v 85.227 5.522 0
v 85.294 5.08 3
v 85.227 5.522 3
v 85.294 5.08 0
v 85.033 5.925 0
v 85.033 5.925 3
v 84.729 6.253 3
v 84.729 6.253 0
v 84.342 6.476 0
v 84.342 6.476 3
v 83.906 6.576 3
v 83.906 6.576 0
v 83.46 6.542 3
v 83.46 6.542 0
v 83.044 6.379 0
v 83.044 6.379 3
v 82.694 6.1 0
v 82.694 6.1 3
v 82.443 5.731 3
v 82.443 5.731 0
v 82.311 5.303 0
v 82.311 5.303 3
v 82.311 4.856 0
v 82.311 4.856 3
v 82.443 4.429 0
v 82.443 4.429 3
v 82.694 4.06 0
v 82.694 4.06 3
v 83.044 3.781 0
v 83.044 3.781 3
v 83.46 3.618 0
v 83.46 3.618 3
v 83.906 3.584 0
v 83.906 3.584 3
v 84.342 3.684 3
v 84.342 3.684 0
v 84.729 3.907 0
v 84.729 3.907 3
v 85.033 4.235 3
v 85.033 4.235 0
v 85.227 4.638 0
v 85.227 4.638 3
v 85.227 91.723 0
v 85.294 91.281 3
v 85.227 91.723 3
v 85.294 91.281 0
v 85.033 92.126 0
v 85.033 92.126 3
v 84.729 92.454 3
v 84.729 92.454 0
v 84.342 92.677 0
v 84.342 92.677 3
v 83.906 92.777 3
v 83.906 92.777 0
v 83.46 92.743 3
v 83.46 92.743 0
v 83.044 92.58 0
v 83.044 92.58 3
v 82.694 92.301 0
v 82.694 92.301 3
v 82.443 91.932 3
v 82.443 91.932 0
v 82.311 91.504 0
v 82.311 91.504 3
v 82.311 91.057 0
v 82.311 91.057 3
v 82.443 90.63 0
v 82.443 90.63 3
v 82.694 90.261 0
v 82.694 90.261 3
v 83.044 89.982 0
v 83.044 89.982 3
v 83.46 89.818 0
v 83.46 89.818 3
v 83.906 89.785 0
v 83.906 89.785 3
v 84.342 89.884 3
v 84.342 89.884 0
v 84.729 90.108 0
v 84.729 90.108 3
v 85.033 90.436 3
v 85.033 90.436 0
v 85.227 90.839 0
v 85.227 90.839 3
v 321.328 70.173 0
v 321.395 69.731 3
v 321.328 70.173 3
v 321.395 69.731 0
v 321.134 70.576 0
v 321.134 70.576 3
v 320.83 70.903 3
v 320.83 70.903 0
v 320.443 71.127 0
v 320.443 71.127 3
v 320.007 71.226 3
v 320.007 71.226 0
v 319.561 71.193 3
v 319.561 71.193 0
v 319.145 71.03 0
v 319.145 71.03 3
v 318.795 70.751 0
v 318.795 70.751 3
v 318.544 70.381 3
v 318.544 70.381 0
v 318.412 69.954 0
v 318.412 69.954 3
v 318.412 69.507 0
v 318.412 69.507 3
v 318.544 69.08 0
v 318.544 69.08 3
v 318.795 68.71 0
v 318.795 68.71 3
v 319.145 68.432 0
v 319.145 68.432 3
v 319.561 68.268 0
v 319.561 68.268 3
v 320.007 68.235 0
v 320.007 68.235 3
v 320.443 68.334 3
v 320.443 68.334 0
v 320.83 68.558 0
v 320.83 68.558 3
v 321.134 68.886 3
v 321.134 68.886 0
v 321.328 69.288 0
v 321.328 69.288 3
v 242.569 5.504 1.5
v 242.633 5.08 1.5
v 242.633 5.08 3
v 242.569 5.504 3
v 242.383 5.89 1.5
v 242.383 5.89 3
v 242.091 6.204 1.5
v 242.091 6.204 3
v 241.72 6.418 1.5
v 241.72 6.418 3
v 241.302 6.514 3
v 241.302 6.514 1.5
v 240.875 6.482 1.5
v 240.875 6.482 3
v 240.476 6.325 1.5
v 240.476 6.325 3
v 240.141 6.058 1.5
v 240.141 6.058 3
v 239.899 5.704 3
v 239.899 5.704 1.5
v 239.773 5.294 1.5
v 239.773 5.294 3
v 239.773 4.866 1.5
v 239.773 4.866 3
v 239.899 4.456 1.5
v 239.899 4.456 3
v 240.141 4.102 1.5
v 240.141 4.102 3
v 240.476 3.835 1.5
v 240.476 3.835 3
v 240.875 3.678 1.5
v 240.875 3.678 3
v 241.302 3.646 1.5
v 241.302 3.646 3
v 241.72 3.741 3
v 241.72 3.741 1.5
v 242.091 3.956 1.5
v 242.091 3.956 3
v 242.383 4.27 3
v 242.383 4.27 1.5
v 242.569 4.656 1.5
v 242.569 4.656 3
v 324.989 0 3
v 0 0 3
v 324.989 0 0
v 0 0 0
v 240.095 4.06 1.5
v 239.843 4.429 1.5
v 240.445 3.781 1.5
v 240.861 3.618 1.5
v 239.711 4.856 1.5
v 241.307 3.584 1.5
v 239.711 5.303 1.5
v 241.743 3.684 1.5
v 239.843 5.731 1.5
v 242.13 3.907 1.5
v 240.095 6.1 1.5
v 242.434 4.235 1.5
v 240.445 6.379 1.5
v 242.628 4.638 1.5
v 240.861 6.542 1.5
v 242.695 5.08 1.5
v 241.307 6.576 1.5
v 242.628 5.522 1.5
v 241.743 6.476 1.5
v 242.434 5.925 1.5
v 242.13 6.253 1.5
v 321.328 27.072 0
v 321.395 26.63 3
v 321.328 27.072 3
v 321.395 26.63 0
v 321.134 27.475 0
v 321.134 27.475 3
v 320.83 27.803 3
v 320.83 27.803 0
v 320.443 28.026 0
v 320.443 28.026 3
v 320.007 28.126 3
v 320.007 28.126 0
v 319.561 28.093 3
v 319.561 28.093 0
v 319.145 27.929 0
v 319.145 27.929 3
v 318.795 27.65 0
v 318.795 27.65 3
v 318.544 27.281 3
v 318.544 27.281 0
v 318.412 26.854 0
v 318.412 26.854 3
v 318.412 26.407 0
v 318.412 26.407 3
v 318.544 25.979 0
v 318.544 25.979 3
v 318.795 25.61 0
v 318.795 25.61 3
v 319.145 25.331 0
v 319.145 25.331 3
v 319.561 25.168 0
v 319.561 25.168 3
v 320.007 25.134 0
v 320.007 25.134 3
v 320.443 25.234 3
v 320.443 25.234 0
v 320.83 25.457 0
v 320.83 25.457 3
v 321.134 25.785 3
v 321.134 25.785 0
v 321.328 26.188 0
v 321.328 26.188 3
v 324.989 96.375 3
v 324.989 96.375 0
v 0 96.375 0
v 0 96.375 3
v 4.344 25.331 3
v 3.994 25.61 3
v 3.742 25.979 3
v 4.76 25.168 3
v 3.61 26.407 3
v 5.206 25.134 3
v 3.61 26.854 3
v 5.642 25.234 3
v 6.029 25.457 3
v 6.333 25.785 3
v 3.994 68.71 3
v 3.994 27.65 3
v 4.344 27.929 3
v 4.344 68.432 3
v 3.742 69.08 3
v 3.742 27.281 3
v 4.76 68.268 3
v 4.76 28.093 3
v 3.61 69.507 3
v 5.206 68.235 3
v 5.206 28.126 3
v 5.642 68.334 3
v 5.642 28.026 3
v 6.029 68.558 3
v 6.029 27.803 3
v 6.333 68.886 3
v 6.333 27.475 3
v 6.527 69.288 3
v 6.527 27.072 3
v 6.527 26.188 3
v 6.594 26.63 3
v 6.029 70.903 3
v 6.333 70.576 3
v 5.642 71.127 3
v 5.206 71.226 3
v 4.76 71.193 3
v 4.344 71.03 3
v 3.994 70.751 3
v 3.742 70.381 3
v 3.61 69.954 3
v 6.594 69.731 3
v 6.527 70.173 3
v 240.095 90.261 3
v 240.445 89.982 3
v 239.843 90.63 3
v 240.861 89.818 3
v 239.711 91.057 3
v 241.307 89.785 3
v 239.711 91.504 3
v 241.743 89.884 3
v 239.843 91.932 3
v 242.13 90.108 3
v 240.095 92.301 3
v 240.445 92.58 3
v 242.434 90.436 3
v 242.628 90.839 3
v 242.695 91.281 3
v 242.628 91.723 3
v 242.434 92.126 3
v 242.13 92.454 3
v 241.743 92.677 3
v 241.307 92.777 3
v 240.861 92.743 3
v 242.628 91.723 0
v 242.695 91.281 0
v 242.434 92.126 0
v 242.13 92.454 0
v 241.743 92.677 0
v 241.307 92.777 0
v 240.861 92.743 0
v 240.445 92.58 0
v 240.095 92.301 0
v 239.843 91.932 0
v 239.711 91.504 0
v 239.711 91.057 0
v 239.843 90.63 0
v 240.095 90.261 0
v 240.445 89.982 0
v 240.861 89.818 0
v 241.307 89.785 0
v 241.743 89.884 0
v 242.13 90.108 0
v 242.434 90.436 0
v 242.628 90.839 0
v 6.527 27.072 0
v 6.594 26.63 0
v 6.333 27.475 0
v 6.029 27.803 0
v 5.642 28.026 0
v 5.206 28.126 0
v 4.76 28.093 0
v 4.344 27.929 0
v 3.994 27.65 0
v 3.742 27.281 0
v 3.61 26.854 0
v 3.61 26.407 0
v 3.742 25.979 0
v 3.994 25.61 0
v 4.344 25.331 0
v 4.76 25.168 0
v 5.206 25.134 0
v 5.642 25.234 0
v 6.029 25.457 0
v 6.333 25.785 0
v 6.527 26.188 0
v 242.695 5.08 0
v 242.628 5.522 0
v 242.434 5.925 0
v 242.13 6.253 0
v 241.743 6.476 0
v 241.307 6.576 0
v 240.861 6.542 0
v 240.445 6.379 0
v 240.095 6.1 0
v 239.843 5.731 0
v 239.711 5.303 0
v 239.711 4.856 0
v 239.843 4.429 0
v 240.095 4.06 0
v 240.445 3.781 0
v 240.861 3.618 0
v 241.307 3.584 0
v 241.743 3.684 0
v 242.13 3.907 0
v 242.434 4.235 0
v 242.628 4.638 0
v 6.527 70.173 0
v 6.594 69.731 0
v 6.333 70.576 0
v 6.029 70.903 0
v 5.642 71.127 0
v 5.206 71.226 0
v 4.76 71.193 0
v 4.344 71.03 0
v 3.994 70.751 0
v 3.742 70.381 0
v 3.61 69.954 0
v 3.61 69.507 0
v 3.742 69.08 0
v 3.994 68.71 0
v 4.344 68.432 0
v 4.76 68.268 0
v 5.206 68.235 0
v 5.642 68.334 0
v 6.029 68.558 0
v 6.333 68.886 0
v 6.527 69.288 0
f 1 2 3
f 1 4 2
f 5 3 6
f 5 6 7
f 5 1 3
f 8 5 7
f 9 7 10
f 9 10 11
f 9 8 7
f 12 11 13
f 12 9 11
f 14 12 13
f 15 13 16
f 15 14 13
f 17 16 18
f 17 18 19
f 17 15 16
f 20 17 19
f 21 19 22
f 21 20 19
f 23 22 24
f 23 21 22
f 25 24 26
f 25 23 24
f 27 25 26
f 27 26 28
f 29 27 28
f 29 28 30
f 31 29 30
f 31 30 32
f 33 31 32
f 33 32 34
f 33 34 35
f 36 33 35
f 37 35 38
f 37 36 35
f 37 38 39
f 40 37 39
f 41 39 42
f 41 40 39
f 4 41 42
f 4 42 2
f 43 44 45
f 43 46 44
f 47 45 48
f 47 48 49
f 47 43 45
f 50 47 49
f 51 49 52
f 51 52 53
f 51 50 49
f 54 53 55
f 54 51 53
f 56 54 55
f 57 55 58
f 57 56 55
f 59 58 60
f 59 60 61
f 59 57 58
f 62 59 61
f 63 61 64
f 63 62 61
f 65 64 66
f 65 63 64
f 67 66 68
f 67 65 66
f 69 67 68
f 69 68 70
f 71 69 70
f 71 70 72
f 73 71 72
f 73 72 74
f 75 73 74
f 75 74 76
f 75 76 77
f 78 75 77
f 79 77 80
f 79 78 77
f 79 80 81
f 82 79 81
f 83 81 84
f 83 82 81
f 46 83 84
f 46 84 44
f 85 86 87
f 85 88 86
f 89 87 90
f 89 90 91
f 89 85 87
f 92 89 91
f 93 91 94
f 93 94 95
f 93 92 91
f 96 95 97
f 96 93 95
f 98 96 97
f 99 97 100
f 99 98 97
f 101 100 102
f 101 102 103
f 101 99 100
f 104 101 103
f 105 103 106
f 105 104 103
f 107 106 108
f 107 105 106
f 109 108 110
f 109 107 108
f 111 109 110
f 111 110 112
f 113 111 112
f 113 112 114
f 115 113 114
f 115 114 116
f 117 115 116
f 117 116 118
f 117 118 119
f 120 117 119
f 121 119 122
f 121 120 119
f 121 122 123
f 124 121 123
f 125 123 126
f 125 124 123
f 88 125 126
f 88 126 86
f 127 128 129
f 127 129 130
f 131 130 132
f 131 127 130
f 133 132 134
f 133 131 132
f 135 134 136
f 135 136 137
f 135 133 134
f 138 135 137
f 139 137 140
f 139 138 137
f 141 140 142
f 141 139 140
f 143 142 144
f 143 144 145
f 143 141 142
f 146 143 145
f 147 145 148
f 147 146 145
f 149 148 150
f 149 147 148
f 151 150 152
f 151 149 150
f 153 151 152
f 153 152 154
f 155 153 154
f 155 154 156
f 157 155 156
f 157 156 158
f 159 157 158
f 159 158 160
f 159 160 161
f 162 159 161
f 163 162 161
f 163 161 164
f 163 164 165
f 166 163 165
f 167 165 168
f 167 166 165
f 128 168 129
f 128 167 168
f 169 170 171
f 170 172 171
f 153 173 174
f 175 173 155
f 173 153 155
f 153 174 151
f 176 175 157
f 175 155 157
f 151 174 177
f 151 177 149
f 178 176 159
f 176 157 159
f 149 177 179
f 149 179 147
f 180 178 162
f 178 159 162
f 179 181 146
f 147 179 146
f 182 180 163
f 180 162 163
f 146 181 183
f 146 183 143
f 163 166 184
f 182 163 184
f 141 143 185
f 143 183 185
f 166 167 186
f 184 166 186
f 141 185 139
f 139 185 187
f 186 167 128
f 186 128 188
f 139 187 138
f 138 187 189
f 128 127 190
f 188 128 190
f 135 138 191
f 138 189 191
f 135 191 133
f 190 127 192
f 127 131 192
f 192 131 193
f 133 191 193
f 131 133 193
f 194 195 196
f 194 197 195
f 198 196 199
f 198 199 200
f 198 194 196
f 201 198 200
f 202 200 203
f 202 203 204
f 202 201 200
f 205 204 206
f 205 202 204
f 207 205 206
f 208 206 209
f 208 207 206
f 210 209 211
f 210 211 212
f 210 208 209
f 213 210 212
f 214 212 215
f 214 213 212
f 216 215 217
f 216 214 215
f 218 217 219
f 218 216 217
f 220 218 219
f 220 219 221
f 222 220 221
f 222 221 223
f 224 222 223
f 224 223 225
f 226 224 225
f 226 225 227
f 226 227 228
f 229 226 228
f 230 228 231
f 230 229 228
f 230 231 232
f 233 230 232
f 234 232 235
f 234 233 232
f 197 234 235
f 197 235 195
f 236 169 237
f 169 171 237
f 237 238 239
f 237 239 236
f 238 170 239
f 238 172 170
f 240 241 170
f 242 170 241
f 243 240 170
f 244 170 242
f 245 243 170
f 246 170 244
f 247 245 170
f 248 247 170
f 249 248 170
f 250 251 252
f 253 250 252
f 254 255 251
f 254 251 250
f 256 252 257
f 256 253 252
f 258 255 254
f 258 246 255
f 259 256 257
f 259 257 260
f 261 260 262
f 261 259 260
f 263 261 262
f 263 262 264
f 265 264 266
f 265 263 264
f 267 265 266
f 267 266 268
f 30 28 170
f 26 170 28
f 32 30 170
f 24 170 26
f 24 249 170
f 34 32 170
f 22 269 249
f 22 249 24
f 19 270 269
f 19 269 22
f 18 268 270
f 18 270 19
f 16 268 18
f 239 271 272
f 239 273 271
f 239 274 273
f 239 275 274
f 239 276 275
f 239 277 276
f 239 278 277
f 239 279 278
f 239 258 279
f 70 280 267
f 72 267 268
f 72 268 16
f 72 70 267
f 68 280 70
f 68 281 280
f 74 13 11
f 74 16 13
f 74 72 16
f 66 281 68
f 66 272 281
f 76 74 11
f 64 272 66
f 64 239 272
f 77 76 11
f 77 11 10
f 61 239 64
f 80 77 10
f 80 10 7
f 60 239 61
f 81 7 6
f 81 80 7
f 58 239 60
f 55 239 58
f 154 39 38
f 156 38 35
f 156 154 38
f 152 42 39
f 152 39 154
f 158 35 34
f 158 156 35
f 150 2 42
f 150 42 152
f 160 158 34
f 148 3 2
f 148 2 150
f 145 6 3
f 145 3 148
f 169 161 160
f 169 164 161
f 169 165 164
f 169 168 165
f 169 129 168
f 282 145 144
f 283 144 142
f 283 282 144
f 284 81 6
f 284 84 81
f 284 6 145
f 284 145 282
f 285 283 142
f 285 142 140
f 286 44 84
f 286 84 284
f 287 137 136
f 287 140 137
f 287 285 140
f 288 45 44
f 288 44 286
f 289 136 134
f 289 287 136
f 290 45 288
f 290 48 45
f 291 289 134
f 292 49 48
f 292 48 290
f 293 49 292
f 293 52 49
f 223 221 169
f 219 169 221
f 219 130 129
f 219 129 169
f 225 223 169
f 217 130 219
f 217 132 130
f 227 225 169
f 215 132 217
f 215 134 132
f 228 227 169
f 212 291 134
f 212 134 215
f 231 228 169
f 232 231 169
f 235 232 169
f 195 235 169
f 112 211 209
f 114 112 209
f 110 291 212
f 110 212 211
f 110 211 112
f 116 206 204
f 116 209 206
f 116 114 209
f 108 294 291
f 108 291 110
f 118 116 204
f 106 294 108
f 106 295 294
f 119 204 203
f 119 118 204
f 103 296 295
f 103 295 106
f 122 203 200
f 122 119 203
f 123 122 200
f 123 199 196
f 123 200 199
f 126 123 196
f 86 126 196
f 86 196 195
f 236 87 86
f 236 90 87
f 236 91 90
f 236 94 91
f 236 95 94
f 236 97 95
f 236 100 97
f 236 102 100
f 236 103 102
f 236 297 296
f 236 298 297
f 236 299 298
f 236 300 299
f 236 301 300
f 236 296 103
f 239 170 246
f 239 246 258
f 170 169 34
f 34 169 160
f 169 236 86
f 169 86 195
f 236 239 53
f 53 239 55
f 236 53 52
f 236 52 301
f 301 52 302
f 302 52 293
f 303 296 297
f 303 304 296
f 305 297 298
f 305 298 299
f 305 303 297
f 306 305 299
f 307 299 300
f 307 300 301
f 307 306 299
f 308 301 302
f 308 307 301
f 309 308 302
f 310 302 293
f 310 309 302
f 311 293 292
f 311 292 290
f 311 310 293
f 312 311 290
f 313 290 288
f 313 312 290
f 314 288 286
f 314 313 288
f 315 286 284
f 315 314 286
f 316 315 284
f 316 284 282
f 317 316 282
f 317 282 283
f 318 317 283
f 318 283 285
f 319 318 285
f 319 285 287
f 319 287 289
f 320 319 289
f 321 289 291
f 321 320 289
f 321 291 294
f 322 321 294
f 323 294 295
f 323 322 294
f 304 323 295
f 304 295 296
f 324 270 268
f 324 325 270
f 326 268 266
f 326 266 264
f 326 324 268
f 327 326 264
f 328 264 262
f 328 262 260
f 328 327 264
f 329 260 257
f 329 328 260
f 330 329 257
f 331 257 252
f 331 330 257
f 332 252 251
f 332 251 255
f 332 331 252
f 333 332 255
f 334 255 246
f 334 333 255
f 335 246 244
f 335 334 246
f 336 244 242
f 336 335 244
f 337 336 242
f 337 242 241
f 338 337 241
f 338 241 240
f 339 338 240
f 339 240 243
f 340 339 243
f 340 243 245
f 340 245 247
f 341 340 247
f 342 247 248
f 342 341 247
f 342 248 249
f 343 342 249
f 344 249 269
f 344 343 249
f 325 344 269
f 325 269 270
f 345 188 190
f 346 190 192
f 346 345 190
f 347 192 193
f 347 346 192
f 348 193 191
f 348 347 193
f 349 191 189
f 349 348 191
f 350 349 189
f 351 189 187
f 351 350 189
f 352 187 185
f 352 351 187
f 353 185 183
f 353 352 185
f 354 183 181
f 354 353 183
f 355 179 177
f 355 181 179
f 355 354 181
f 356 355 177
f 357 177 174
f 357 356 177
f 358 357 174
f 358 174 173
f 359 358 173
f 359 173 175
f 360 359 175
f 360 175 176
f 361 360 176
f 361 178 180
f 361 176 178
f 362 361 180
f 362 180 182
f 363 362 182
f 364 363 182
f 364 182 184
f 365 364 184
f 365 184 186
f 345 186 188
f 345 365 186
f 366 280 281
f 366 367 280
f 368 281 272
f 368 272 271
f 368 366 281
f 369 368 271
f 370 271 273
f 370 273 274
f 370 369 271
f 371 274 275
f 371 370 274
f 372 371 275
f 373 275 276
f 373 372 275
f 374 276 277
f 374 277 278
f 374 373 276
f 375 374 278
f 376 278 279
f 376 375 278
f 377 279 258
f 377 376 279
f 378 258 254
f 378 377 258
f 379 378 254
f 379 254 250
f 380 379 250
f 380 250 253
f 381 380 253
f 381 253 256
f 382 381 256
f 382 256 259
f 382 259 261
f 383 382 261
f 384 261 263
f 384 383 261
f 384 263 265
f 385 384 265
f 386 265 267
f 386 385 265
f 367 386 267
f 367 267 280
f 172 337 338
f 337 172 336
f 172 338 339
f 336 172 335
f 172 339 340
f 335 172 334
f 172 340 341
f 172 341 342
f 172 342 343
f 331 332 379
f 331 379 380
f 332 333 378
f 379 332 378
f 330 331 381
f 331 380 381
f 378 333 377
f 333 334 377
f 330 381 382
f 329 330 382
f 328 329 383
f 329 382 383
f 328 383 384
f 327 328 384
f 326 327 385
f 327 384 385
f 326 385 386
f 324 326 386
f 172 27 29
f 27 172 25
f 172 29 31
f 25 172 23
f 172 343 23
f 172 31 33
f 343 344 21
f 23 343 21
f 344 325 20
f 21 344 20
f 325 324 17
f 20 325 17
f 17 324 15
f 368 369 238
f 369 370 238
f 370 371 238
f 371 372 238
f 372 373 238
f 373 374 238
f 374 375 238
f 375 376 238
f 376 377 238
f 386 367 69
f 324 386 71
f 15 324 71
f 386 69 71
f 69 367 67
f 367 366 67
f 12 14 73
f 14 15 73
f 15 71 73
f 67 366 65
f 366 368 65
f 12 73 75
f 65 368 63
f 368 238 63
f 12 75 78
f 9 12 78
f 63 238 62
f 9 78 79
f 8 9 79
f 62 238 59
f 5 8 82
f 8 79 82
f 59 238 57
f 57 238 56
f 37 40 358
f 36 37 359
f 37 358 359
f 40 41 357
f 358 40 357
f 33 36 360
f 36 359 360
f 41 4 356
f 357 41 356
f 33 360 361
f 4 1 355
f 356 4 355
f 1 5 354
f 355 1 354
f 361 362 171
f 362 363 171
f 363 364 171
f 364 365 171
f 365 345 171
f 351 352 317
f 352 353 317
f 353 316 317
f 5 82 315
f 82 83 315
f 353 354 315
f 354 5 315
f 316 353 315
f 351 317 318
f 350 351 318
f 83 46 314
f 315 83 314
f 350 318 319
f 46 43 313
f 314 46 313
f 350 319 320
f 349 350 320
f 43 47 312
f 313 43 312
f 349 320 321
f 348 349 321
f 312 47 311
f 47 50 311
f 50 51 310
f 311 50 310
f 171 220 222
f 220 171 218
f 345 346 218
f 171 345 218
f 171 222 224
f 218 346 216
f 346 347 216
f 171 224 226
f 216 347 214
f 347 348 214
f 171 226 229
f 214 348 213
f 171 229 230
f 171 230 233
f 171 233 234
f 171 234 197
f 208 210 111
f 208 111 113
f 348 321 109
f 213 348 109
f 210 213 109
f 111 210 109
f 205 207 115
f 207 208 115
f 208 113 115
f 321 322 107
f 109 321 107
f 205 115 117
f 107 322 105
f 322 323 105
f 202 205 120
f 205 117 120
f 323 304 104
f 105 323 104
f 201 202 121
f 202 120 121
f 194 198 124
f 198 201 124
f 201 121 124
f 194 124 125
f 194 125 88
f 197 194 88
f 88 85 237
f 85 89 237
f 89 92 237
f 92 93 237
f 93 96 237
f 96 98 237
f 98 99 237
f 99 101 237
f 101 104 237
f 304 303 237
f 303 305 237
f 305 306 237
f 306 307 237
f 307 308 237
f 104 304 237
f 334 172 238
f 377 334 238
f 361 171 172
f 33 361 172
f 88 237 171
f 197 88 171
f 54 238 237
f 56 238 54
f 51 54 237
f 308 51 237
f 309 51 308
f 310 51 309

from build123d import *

# Parameters (mm, degrees)
MODEL_W             = 304.8012934
MODEL_H             = 76.2008736
MODEL_W_2           = 13.9995
MODEL_H_2           = 13.9995
MODEL_W_3           = 13.9994
MODEL_W_4           = 13.9992
MODEL_W_5           = 3.302
MODEL_H_3           = 14.2007
MODEL_W_6           = 13.999
MODEL_W_7           = 3.3
MODEL_W_8           = 3.3004
MODEL_H_4           = 14.2005
MODEL_W_9           = 14.0008
MODEL_W_10          = 3.2992
MODEL_W_11          = 13.9991
MODEL_W_12          = 14.001
MODEL_H_5           = 13.9996
BOSS_EXTRUDE2_DEPTH = 1.5
SKETCH3_W           = 324.9887066
SKETCH3_H           = 96.3745066
SKETCH3_W_2         = 304.8012934
SKETCH3_H_2         = 76.2008736
BOSS_EXTRUDE4_DEPTH = 1.5
SKETCH4_R           = 1.5
CUT_EXTRUDE2_DEPTH  = 2.54
BOSS_EXTRUDE5_DEPTH = 1.5
SKETCH6_W           = 324.9887066
SKETCH6_H           = 96.3745066
SKETCH6_R           = 1.5
SKETCH6_R_2         = 1.437968672
BOSS_EXTRUDE6_DEPTH = 1.5


with BuildPart() as part:
    # Model → Boss-Extrude2 (new body)
    with BuildSketch(Plane.XY):
        with Locations((162.4943533, 48.1803632)):
            Rectangle(MODEL_W, MODEL_H)
        with Locations((19.61845, 19.60605)):
            Rectangle(MODEL_W_2, MODEL_H_2, mode=Mode.SUBTRACT)
        with Locations((38.6684, 19.60605)):
            Rectangle(MODEL_W_3, MODEL_H_2, mode=Mode.SUBTRACT)
        with Locations((57.7185, 19.60605)):
            Rectangle(MODEL_W_4, MODEL_H_2, mode=Mode.SUBTRACT)
        with Locations((76.7685, 19.60605)):
            Rectangle(MODEL_W_4, MODEL_H_2, mode=Mode.SUBTRACT)
        with Locations((131.543, 18.95565)):
            Rectangle(MODEL_W_5, MODEL_H_3, mode=Mode.SUBTRACT)
        with Locations((143.4435, 19.60605)):
            Rectangle(MODEL_W_6, MODEL_H_2, mode=Mode.SUBTRACT)
        with Locations((155.344, 18.95565)):
            Rectangle(MODEL_W_7, MODEL_H_3, mode=Mode.SUBTRACT)
        with Locations((17.2427, 38.00555)):
            Rectangle(MODEL_W_8, MODEL_H_4, mode=Mode.SUBTRACT)
        with Locations((29.1427, 38.65605)):
            Rectangle(MODEL_W_9, MODEL_H_2, mode=Mode.SUBTRACT)
        with Locations((41.0436, 38.00555)):
            Rectangle(MODEL_W_10, MODEL_H_4, mode=Mode.SUBTRACT)
        with Locations((57.7185, 38.65605)):
            Rectangle(MODEL_W_4, MODEL_H_2, mode=Mode.SUBTRACT)
        with Locations((76.7685, 38.65605)):
            Rectangle(MODEL_W_4, MODEL_H_2, mode=Mode.SUBTRACT)
        with Locations((95.81845, 38.65605)):
            Rectangle(MODEL_W_11, MODEL_H_2, mode=Mode.SUBTRACT)
        with Locations((114.8675, 38.65605)):
            Rectangle(MODEL_W_12, MODEL_H_2, mode=Mode.SUBTRACT)
        with Locations((133.9185, 38.65605)):
            Rectangle(MODEL_W_6, MODEL_H_2, mode=Mode.SUBTRACT)
        with Locations((152.9685, 38.65605)):
            Rectangle(MODEL_W_6, MODEL_H_2, mode=Mode.SUBTRACT)
        with Locations((169.643, 18.95565)):
            Rectangle(MODEL_W_5, MODEL_H_3, mode=Mode.SUBTRACT)
        with Locations((181.5435, 19.60605)):
            Rectangle(MODEL_W_6, MODEL_H_2, mode=Mode.SUBTRACT)
        with Locations((193.444, 18.95565)):
            Rectangle(MODEL_W_7, MODEL_H_3, mode=Mode.SUBTRACT)
        with Locations((248.2185, 19.60605)):
            Rectangle(MODEL_W_6, MODEL_H_2, mode=Mode.SUBTRACT)
        with Locations((267.2685, 19.60605)):
            Rectangle(MODEL_W_6, MODEL_H_2, mode=Mode.SUBTRACT)
        with Locations((286.3185, 19.60605)):
            Rectangle(MODEL_W_6, MODEL_H_2, mode=Mode.SUBTRACT)
        with Locations((305.3685, 19.60605)):
            Rectangle(MODEL_W_6, MODEL_H_2, mode=Mode.SUBTRACT)
        with Locations((172.0185, 38.65605)):
            Rectangle(MODEL_W_6, MODEL_H_2, mode=Mode.SUBTRACT)
        with Locations((191.0685, 38.65605)):
            Rectangle(MODEL_W_6, MODEL_H_2, mode=Mode.SUBTRACT)
        with Locations((210.1185, 38.65605)):
            Rectangle(MODEL_W_6, MODEL_H_2, mode=Mode.SUBTRACT)
        with Locations((229.1685, 38.65605)):
            Rectangle(MODEL_W_6, MODEL_H_2, mode=Mode.SUBTRACT)
        with Locations((248.2185, 38.65605)):
            Rectangle(MODEL_W_6, MODEL_H_2, mode=Mode.SUBTRACT)
        with Locations((267.2685, 38.65605)):
            Rectangle(MODEL_W_6, MODEL_H_2, mode=Mode.SUBTRACT)
        with Locations((283.944, 38.00555)):
            Rectangle(MODEL_W_7, MODEL_H_4, mode=Mode.SUBTRACT)
        with Locations((295.8435, 38.65605)):
            Rectangle(MODEL_W_6, MODEL_H_2, mode=Mode.SUBTRACT)
        with Locations((307.744, 38.00555)):
            Rectangle(MODEL_W_7, MODEL_H_4, mode=Mode.SUBTRACT)
        with Locations((19.61845, 57.706)):
            Rectangle(MODEL_W_2, MODEL_H_5, mode=Mode.SUBTRACT)
        with Locations((38.6684, 57.706)):
            Rectangle(MODEL_W_3, MODEL_H_5, mode=Mode.SUBTRACT)
        with Locations((57.7185, 57.706)):
            Rectangle(MODEL_W_4, MODEL_H_5, mode=Mode.SUBTRACT)
        with Locations((76.7685, 57.706)):
            Rectangle(MODEL_W_4, MODEL_H_5, mode=Mode.SUBTRACT)
        with Locations((95.81845, 57.706)):
            Rectangle(MODEL_W_11, MODEL_H_5, mode=Mode.SUBTRACT)
        with Locations((114.8675, 57.706)):
            Rectangle(MODEL_W_12, MODEL_H_5, mode=Mode.SUBTRACT)
        with Locations((133.9185, 57.706)):
            Rectangle(MODEL_W_6, MODEL_H_5, mode=Mode.SUBTRACT)
        with Locations((152.9685, 57.706)):
            Rectangle(MODEL_W_6, MODEL_H_5, mode=Mode.SUBTRACT)
        with Locations((17.2427, 76.10545)):
            Rectangle(MODEL_W_8, MODEL_H_3, mode=Mode.SUBTRACT)
        with Locations((29.1427, 76.756)):
            Rectangle(MODEL_W_9, MODEL_H_5, mode=Mode.SUBTRACT)
        with Locations((41.0436, 76.10545)):
            Rectangle(MODEL_W_10, MODEL_H_3, mode=Mode.SUBTRACT)
        with Locations((57.7185, 76.756)):
            Rectangle(MODEL_W_4, MODEL_H_5, mode=Mode.SUBTRACT)
        with Locations((76.7685, 76.756)):
            Rectangle(MODEL_W_4, MODEL_H_5, mode=Mode.SUBTRACT)
        with Locations((95.81845, 76.756)):
            Rectangle(MODEL_W_11, MODEL_H_5, mode=Mode.SUBTRACT)
        with Locations((114.8675, 76.756)):
            Rectangle(MODEL_W_12, MODEL_H_5, mode=Mode.SUBTRACT)
        with Locations((133.9185, 76.756)):
            Rectangle(MODEL_W_6, MODEL_H_5, mode=Mode.SUBTRACT)
        with Locations((152.9685, 76.756)):
            Rectangle(MODEL_W_6, MODEL_H_5, mode=Mode.SUBTRACT)
        with Locations((172.0185, 57.706)):
            Rectangle(MODEL_W_6, MODEL_H_5, mode=Mode.SUBTRACT)
        with Locations((191.0685, 57.706)):
            Rectangle(MODEL_W_6, MODEL_H_5, mode=Mode.SUBTRACT)
        with Locations((210.1185, 57.706)):
            Rectangle(MODEL_W_6, MODEL_H_5, mode=Mode.SUBTRACT)
        with Locations((229.1685, 57.706)):
            Rectangle(MODEL_W_6, MODEL_H_5, mode=Mode.SUBTRACT)
        with Locations((248.2185, 57.706)):
            Rectangle(MODEL_W_6, MODEL_H_5, mode=Mode.SUBTRACT)
        with Locations((267.2685, 57.706)):
            Rectangle(MODEL_W_6, MODEL_H_5, mode=Mode.SUBTRACT)
        with Locations((286.3185, 57.706)):
            Rectangle(MODEL_W_6, MODEL_H_5, mode=Mode.SUBTRACT)
        with Locations((305.3685, 57.706)):
            Rectangle(MODEL_W_6, MODEL_H_5, mode=Mode.SUBTRACT)
        with Locations((172.0185, 76.756)):
            Rectangle(MODEL_W_6, MODEL_H_5, mode=Mode.SUBTRACT)
        with Locations((191.0685, 76.756)):
            Rectangle(MODEL_W_6, MODEL_H_5, mode=Mode.SUBTRACT)
        with Locations((210.1185, 76.756)):
            Rectangle(MODEL_W_6, MODEL_H_5, mode=Mode.SUBTRACT)
        with Locations((229.1685, 76.756)):
            Rectangle(MODEL_W_6, MODEL_H_5, mode=Mode.SUBTRACT)
        with Locations((248.2185, 76.756)):
            Rectangle(MODEL_W_6, MODEL_H_5, mode=Mode.SUBTRACT)
        with Locations((267.2685, 76.756)):
            Rectangle(MODEL_W_6, MODEL_H_5, mode=Mode.SUBTRACT)
        with Locations((283.944, 76.10545)):
            Rectangle(MODEL_W_7, MODEL_H_3, mode=Mode.SUBTRACT)
        with Locations((295.8435, 76.756)):
            Rectangle(MODEL_W_6, MODEL_H_5, mode=Mode.SUBTRACT)
        with Locations((307.744, 76.10545)):
            Rectangle(MODEL_W_7, MODEL_H_3, mode=Mode.SUBTRACT)
    extrude(amount=BOSS_EXTRUDE2_DEPTH)

    # Sketch3 → Boss-Extrude4 (add)
    with BuildSketch(Plane.XY.offset(1.5)):
        with Locations((162.4943533, 48.1872533)):
            Rectangle(SKETCH3_W, SKETCH3_H)
        with Locations((162.4943533, 48.1803632)):
            Rectangle(SKETCH3_W_2, SKETCH3_H_2, mode=Mode.SUBTRACT)
    extrude(amount=-BOSS_EXTRUDE4_DEPTH)

    # Sketch4 → Cut-Extrude2 (cut)
    with BuildSketch(Plane.XY):
        with Locations((5.0937066, 69.7305816)):
            Circle(SKETCH4_R)
        with Locations((5.0937066, 26.6301448)):
            Circle(SKETCH4_R)
        with Locations((83.79402995, 5.0799264)):
            Circle(SKETCH4_R)
        with Locations((241.19467665, 5.0799264)):
            Circle(SKETCH4_R)
        with Locations((319.895, 26.6301448)):
            Circle(SKETCH4_R)
        with Locations((319.895, 69.7305816)):
            Circle(SKETCH4_R)
        with Locations((241.19467665, 91.2808)):
            Circle(SKETCH4_R)
        with Locations((83.79402995, 91.2808)):
            Circle(SKETCH4_R)
    extrude(amount=CUT_EXTRUDE2_DEPTH, mode=Mode.SUBTRACT)

    # Sketch5 → Boss-Extrude5 (add)
    with BuildSketch(Plane.XY.offset(1.5)):
        Polygon((114.22283219, 12.6063), (12.6187, 12.6063), (12.6187, 64.7058), (12.6187, 85.328205222), (312.368, 85.328205222), (312.368, 64.7058), (312.368, 12.6063), (207.016630052, 12.6063), (207.016630052, 7.29705702), (114.22283219, 7.29705702), align=None)
    extrude(amount=-BOSS_EXTRUDE5_DEPTH)

    # Sketch6 → Boss-Extrude6 (add)
    with BuildSketch(Plane.XY.offset(1.5)):
        with Locations((162.4943533, 48.1872533)):
            Rectangle(SKETCH6_W, SKETCH6_H)
        with Locations((319.895, 69.7305816)):
            Circle(SKETCH6_R, mode=Mode.SUBTRACT)
        with Locations((319.895, 26.6301448)):
            Circle(SKETCH6_R, mode=Mode.SUBTRACT)
        with Locations((241.19467665, 5.0799264)):
            Circle(SKETCH6_R_2, mode=Mode.SUBTRACT)
        with Locations((241.19467665, 91.2808)):
            Circle(SKETCH6_R, mode=Mode.SUBTRACT)
        with Locations((5.0937066, 26.6301448)):
            Circle(SKETCH6_R, mode=Mode.SUBTRACT)
        with Locations((83.79402995, 5.0799264)):
            Circle(SKETCH6_R, mode=Mode.SUBTRACT)
        with Locations((83.79402995, 91.2808)):
            Circle(SKETCH6_R, mode=Mode.SUBTRACT)
        with Locations((5.0937066, 69.7305816)):
            Circle(SKETCH6_R, mode=Mode.SUBTRACT)
    extrude(amount=BOSS_EXTRUDE6_DEPTH)


solid = part.part
